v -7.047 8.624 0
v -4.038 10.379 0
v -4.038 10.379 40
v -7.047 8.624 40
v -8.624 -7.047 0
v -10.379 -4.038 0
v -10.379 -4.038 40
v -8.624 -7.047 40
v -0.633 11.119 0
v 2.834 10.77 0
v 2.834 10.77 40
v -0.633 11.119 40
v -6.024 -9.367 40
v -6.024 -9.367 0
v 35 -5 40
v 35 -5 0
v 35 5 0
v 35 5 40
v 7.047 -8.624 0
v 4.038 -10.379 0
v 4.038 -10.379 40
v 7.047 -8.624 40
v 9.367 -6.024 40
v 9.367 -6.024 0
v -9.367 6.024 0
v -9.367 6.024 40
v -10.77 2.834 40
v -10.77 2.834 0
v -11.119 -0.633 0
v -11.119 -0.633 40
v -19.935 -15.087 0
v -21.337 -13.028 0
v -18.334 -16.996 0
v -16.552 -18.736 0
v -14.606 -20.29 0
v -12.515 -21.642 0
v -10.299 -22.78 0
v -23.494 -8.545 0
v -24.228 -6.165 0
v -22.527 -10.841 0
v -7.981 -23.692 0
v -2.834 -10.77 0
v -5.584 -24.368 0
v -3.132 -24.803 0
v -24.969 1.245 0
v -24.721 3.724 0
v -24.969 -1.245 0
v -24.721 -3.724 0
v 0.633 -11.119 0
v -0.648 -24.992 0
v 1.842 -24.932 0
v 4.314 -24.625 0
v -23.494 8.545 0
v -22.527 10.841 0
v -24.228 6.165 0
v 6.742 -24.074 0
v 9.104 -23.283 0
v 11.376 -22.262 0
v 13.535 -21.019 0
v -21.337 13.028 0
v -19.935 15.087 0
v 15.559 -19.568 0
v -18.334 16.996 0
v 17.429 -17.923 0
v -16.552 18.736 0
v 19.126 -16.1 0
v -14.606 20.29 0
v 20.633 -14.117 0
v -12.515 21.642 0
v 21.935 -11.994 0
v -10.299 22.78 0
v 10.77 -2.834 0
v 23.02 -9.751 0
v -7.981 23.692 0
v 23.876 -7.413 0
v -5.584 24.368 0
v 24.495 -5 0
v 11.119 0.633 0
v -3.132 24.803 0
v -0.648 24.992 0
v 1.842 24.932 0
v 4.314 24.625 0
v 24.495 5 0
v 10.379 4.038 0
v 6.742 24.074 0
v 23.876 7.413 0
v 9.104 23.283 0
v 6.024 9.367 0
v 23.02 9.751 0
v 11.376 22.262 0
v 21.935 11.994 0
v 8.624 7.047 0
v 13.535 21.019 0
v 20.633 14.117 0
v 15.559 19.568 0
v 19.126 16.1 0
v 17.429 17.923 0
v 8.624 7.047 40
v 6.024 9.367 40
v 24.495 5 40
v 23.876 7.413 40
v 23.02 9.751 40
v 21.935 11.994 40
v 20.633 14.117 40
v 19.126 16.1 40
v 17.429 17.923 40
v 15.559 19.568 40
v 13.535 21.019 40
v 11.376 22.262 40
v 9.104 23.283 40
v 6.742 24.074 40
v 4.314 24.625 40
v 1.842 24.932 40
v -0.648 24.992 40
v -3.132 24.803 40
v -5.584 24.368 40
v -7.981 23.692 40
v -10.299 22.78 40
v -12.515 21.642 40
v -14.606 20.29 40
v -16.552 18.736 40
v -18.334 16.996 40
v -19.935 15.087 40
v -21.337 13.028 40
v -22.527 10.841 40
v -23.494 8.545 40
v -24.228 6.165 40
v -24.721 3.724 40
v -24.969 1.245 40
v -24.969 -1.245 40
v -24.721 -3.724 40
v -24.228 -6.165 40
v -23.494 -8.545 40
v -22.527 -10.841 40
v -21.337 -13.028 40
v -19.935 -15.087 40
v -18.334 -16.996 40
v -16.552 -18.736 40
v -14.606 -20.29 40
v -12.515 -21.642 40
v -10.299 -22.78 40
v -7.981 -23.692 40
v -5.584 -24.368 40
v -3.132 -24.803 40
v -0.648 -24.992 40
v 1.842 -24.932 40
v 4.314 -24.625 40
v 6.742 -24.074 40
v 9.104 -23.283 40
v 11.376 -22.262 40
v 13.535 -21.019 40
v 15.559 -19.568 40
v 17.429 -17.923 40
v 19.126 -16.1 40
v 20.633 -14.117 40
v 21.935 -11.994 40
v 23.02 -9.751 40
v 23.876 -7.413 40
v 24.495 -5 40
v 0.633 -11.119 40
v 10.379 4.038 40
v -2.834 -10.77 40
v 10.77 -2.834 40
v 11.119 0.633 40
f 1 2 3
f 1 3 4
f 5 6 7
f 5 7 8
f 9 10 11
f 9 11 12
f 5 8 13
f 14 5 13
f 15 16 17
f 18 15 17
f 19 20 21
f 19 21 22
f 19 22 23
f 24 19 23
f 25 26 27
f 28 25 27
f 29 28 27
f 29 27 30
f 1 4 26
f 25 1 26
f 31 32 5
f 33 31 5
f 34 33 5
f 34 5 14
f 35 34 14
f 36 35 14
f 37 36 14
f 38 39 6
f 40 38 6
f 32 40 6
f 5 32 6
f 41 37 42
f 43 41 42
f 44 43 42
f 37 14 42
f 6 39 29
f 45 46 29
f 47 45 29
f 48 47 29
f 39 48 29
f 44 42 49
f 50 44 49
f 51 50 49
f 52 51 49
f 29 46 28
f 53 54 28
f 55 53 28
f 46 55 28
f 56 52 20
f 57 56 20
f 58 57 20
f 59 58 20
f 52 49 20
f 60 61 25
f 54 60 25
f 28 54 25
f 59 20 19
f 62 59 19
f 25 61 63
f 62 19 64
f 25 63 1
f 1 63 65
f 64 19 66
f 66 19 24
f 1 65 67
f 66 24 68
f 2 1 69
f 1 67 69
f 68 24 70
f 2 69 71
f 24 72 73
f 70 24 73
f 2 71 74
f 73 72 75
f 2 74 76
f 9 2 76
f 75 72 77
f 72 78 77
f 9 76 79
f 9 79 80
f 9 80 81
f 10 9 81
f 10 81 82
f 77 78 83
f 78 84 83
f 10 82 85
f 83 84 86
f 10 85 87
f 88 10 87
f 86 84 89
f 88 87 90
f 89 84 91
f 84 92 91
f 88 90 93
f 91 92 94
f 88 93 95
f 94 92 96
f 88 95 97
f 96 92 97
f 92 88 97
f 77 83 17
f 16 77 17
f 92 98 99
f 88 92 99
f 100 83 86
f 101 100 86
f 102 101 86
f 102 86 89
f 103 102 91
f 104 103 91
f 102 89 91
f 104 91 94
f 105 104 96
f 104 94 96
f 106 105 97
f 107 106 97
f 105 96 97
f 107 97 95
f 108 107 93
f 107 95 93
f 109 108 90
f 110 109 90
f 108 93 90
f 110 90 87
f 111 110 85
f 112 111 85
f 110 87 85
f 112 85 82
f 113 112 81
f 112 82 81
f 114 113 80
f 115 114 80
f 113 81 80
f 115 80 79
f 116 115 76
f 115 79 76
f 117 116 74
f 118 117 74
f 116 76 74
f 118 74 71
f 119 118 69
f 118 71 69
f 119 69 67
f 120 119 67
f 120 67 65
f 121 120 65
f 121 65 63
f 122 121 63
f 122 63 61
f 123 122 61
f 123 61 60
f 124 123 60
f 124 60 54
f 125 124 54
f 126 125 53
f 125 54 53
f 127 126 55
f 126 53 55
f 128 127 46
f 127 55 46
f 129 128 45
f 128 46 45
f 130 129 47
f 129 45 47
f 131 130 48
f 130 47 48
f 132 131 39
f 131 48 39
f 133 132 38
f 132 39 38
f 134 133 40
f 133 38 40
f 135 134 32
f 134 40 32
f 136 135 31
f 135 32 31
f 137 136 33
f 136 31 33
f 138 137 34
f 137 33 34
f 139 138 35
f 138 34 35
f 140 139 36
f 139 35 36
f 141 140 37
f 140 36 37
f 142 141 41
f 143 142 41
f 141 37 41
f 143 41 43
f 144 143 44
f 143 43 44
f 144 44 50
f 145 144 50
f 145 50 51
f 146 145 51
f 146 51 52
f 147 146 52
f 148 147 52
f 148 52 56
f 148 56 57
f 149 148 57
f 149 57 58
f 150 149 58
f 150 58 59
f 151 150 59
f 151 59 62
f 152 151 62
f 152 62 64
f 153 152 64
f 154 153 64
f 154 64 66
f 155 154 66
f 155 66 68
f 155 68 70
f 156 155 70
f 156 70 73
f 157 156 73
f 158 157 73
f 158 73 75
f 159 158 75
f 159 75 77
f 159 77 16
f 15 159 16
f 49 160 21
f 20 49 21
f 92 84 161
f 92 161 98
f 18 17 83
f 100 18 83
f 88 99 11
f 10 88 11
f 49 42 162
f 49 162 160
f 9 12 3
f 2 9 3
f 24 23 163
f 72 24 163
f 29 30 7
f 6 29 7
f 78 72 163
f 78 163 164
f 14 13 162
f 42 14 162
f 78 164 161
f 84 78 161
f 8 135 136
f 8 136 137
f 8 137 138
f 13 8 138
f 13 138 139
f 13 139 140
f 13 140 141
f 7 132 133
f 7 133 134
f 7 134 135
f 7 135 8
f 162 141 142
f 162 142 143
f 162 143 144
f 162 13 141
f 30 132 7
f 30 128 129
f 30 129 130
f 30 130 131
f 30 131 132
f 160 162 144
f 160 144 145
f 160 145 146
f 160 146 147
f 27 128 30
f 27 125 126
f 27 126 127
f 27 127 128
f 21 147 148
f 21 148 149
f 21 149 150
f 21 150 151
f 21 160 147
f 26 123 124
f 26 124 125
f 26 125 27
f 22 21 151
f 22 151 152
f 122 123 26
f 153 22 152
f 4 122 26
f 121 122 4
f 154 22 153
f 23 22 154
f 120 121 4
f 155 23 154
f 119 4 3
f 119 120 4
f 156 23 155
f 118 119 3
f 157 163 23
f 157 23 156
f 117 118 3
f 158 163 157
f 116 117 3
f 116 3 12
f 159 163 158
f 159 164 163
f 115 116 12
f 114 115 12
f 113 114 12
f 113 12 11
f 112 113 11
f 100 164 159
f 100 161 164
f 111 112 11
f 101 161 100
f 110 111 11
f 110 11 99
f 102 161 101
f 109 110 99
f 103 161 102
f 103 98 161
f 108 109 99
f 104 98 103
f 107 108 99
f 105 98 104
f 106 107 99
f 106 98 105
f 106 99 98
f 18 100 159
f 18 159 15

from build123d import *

# Parameters (mm, degrees)
F1_DEPTH = 40
F3_DEPTH = 50


with BuildPart() as f1:
    # F0 (on Top) → F1 (new body)
    with BuildSketch(Plane.XY):
        with BuildLine():
            Line((35, 5), (24.494897, 5))
            ThreePointArc((24.494897, 5), (-25, 0), (24.494897, -5))
            Line((24.494897, -5), (35, -5))
            Line((35, -5), (35, 5))
        make_face()
    extrude(amount=F1_DEPTH)

    # F2 (on face) → F3 (cut)
    with BuildSketch(Plane.XY.offset(40)):
        Polygon((-10.379426, -4.037681), (-8.623709, -7.047482), (-6.023843, -9.367426), (-2.834321, -10.770422), (0.632644, -11.119133), (4.037681, -10.379426), (7.047482, -8.623709), (9.367426, -6.023843), (10.770422, -2.834321), (11.119133, 0.632644), (10.379426, 4.037681), (8.623709, 7.047482), (6.023843, 9.367426), (2.834321, 10.770422), (-0.632644, 11.119133), (-4.037681, 10.379426), (-7.047482, 8.623709), (-9.367426, 6.023843), (-10.770422, 2.834321), (-11.119133, -0.632644), align=None)
    extrude(amount=-F3_DEPTH, mode=Mode.SUBTRACT)


solid = f1.part
